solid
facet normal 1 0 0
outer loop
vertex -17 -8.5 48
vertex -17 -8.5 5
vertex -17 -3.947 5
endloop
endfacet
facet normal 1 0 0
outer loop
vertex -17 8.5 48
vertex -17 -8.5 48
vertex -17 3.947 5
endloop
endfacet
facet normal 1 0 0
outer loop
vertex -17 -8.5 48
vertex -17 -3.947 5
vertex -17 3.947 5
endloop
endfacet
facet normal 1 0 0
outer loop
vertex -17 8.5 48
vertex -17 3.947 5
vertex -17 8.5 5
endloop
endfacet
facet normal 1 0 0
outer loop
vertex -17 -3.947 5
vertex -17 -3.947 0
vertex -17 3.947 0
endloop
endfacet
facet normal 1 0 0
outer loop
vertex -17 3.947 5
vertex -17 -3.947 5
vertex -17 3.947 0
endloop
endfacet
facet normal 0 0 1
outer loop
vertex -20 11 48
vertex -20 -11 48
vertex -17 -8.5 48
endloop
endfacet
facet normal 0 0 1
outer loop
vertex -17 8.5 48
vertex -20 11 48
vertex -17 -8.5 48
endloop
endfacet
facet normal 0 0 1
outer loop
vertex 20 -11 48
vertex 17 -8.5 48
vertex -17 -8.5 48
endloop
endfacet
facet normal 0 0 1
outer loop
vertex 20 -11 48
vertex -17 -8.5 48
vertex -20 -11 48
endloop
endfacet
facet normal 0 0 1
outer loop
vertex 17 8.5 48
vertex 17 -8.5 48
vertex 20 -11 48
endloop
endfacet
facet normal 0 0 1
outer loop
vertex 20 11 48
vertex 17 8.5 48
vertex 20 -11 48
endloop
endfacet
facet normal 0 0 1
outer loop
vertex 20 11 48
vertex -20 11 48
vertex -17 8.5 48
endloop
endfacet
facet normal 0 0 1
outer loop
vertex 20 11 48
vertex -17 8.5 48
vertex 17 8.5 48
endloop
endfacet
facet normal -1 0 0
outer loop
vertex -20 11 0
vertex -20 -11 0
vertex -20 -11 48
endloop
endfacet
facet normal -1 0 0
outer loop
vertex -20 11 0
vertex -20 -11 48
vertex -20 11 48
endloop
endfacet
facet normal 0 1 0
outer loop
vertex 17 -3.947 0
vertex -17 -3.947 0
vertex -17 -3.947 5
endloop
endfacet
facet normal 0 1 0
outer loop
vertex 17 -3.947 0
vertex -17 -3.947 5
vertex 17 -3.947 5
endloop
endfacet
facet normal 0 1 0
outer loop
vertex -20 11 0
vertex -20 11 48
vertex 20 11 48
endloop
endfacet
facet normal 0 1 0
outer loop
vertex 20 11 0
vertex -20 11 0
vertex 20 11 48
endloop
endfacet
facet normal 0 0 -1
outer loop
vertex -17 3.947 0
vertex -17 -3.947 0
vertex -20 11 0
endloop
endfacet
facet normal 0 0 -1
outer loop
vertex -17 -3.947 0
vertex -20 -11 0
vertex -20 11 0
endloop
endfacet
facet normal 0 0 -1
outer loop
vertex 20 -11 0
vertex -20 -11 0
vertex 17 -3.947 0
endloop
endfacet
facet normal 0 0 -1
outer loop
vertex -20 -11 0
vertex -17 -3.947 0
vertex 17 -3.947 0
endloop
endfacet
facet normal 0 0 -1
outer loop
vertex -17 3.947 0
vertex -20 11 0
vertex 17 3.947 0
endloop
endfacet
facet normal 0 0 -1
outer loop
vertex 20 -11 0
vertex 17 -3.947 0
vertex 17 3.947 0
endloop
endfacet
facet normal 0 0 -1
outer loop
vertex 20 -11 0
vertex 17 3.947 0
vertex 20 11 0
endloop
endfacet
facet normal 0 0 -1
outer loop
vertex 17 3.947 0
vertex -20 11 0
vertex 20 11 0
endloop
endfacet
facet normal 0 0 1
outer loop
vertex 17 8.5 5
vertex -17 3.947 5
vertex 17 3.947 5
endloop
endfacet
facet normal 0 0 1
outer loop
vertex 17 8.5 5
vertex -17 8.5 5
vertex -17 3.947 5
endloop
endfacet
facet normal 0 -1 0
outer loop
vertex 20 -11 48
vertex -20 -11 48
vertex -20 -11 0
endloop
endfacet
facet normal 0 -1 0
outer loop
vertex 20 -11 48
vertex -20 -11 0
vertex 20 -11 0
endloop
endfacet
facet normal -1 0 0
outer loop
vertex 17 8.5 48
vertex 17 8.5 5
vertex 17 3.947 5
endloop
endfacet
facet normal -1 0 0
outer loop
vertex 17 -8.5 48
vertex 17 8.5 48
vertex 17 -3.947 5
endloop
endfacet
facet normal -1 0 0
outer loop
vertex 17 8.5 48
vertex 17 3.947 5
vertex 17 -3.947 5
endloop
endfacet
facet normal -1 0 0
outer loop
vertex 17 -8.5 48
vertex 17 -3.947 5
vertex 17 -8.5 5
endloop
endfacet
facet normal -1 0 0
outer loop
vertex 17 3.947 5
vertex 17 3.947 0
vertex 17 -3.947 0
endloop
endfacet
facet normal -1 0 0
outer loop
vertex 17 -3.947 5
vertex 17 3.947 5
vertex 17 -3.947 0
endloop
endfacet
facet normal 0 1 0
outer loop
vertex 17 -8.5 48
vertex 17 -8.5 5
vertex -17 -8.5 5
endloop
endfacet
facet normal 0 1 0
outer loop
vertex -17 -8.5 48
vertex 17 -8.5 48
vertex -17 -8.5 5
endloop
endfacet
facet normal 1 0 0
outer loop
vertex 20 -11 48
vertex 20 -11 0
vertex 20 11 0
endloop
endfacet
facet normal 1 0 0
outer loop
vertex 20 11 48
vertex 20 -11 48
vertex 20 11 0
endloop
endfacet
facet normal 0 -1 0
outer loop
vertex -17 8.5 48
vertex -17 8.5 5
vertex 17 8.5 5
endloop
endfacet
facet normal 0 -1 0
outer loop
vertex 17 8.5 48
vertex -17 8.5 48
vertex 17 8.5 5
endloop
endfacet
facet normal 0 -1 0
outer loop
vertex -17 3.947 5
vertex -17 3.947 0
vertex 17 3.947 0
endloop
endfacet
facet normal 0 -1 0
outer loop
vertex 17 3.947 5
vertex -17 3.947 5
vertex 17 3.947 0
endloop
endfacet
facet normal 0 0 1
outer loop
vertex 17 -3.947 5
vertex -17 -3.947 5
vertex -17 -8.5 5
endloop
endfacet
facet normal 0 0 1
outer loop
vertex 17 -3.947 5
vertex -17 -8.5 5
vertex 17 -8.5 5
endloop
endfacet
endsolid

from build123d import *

# Parameters (mm, degrees)
F0_W     = 40
F0_H     = 22
F0_W_2   = 34
F0_H_2   = 4.5532393306
F1_DEPTH = 5
F2_DEPTH = 48


with BuildPart() as f1:
    # F0 (on Top) → F1 (new body)
    with BuildSketch(Plane.XY):
        Rectangle(F0_W, F0_H)
        Polygon((17, -3.9467606694), (17, -8.5), (-17, -8.5), (-17, -3.9467606694), (-17, 3.9467606694), (-17, 8.5), (17, 8.5), (17, 3.9467606694), align=None, mode=Mode.SUBTRACT)
        with Locations((0, -6.2233803347)):
            Rectangle(F0_W_2, F0_H_2)
        with Locations((0, 6.2233803347)):
            Rectangle(F0_W_2, F0_H_2)
    extrude(amount=F1_DEPTH)

    # F0 (on Top) → F2 (join)
    with BuildSketch(Plane.XY):
        Rectangle(F0_W, F0_H)
        Polygon((17, -3.9467606694), (17, -8.5), (-17, -8.5), (-17, -3.9467606694), (-17, 3.9467606694), (-17, 8.5), (17, 8.5), (17, 3.9467606694), align=None, mode=Mode.SUBTRACT)
    extrude(amount=F2_DEPTH)


solid = f1.part
